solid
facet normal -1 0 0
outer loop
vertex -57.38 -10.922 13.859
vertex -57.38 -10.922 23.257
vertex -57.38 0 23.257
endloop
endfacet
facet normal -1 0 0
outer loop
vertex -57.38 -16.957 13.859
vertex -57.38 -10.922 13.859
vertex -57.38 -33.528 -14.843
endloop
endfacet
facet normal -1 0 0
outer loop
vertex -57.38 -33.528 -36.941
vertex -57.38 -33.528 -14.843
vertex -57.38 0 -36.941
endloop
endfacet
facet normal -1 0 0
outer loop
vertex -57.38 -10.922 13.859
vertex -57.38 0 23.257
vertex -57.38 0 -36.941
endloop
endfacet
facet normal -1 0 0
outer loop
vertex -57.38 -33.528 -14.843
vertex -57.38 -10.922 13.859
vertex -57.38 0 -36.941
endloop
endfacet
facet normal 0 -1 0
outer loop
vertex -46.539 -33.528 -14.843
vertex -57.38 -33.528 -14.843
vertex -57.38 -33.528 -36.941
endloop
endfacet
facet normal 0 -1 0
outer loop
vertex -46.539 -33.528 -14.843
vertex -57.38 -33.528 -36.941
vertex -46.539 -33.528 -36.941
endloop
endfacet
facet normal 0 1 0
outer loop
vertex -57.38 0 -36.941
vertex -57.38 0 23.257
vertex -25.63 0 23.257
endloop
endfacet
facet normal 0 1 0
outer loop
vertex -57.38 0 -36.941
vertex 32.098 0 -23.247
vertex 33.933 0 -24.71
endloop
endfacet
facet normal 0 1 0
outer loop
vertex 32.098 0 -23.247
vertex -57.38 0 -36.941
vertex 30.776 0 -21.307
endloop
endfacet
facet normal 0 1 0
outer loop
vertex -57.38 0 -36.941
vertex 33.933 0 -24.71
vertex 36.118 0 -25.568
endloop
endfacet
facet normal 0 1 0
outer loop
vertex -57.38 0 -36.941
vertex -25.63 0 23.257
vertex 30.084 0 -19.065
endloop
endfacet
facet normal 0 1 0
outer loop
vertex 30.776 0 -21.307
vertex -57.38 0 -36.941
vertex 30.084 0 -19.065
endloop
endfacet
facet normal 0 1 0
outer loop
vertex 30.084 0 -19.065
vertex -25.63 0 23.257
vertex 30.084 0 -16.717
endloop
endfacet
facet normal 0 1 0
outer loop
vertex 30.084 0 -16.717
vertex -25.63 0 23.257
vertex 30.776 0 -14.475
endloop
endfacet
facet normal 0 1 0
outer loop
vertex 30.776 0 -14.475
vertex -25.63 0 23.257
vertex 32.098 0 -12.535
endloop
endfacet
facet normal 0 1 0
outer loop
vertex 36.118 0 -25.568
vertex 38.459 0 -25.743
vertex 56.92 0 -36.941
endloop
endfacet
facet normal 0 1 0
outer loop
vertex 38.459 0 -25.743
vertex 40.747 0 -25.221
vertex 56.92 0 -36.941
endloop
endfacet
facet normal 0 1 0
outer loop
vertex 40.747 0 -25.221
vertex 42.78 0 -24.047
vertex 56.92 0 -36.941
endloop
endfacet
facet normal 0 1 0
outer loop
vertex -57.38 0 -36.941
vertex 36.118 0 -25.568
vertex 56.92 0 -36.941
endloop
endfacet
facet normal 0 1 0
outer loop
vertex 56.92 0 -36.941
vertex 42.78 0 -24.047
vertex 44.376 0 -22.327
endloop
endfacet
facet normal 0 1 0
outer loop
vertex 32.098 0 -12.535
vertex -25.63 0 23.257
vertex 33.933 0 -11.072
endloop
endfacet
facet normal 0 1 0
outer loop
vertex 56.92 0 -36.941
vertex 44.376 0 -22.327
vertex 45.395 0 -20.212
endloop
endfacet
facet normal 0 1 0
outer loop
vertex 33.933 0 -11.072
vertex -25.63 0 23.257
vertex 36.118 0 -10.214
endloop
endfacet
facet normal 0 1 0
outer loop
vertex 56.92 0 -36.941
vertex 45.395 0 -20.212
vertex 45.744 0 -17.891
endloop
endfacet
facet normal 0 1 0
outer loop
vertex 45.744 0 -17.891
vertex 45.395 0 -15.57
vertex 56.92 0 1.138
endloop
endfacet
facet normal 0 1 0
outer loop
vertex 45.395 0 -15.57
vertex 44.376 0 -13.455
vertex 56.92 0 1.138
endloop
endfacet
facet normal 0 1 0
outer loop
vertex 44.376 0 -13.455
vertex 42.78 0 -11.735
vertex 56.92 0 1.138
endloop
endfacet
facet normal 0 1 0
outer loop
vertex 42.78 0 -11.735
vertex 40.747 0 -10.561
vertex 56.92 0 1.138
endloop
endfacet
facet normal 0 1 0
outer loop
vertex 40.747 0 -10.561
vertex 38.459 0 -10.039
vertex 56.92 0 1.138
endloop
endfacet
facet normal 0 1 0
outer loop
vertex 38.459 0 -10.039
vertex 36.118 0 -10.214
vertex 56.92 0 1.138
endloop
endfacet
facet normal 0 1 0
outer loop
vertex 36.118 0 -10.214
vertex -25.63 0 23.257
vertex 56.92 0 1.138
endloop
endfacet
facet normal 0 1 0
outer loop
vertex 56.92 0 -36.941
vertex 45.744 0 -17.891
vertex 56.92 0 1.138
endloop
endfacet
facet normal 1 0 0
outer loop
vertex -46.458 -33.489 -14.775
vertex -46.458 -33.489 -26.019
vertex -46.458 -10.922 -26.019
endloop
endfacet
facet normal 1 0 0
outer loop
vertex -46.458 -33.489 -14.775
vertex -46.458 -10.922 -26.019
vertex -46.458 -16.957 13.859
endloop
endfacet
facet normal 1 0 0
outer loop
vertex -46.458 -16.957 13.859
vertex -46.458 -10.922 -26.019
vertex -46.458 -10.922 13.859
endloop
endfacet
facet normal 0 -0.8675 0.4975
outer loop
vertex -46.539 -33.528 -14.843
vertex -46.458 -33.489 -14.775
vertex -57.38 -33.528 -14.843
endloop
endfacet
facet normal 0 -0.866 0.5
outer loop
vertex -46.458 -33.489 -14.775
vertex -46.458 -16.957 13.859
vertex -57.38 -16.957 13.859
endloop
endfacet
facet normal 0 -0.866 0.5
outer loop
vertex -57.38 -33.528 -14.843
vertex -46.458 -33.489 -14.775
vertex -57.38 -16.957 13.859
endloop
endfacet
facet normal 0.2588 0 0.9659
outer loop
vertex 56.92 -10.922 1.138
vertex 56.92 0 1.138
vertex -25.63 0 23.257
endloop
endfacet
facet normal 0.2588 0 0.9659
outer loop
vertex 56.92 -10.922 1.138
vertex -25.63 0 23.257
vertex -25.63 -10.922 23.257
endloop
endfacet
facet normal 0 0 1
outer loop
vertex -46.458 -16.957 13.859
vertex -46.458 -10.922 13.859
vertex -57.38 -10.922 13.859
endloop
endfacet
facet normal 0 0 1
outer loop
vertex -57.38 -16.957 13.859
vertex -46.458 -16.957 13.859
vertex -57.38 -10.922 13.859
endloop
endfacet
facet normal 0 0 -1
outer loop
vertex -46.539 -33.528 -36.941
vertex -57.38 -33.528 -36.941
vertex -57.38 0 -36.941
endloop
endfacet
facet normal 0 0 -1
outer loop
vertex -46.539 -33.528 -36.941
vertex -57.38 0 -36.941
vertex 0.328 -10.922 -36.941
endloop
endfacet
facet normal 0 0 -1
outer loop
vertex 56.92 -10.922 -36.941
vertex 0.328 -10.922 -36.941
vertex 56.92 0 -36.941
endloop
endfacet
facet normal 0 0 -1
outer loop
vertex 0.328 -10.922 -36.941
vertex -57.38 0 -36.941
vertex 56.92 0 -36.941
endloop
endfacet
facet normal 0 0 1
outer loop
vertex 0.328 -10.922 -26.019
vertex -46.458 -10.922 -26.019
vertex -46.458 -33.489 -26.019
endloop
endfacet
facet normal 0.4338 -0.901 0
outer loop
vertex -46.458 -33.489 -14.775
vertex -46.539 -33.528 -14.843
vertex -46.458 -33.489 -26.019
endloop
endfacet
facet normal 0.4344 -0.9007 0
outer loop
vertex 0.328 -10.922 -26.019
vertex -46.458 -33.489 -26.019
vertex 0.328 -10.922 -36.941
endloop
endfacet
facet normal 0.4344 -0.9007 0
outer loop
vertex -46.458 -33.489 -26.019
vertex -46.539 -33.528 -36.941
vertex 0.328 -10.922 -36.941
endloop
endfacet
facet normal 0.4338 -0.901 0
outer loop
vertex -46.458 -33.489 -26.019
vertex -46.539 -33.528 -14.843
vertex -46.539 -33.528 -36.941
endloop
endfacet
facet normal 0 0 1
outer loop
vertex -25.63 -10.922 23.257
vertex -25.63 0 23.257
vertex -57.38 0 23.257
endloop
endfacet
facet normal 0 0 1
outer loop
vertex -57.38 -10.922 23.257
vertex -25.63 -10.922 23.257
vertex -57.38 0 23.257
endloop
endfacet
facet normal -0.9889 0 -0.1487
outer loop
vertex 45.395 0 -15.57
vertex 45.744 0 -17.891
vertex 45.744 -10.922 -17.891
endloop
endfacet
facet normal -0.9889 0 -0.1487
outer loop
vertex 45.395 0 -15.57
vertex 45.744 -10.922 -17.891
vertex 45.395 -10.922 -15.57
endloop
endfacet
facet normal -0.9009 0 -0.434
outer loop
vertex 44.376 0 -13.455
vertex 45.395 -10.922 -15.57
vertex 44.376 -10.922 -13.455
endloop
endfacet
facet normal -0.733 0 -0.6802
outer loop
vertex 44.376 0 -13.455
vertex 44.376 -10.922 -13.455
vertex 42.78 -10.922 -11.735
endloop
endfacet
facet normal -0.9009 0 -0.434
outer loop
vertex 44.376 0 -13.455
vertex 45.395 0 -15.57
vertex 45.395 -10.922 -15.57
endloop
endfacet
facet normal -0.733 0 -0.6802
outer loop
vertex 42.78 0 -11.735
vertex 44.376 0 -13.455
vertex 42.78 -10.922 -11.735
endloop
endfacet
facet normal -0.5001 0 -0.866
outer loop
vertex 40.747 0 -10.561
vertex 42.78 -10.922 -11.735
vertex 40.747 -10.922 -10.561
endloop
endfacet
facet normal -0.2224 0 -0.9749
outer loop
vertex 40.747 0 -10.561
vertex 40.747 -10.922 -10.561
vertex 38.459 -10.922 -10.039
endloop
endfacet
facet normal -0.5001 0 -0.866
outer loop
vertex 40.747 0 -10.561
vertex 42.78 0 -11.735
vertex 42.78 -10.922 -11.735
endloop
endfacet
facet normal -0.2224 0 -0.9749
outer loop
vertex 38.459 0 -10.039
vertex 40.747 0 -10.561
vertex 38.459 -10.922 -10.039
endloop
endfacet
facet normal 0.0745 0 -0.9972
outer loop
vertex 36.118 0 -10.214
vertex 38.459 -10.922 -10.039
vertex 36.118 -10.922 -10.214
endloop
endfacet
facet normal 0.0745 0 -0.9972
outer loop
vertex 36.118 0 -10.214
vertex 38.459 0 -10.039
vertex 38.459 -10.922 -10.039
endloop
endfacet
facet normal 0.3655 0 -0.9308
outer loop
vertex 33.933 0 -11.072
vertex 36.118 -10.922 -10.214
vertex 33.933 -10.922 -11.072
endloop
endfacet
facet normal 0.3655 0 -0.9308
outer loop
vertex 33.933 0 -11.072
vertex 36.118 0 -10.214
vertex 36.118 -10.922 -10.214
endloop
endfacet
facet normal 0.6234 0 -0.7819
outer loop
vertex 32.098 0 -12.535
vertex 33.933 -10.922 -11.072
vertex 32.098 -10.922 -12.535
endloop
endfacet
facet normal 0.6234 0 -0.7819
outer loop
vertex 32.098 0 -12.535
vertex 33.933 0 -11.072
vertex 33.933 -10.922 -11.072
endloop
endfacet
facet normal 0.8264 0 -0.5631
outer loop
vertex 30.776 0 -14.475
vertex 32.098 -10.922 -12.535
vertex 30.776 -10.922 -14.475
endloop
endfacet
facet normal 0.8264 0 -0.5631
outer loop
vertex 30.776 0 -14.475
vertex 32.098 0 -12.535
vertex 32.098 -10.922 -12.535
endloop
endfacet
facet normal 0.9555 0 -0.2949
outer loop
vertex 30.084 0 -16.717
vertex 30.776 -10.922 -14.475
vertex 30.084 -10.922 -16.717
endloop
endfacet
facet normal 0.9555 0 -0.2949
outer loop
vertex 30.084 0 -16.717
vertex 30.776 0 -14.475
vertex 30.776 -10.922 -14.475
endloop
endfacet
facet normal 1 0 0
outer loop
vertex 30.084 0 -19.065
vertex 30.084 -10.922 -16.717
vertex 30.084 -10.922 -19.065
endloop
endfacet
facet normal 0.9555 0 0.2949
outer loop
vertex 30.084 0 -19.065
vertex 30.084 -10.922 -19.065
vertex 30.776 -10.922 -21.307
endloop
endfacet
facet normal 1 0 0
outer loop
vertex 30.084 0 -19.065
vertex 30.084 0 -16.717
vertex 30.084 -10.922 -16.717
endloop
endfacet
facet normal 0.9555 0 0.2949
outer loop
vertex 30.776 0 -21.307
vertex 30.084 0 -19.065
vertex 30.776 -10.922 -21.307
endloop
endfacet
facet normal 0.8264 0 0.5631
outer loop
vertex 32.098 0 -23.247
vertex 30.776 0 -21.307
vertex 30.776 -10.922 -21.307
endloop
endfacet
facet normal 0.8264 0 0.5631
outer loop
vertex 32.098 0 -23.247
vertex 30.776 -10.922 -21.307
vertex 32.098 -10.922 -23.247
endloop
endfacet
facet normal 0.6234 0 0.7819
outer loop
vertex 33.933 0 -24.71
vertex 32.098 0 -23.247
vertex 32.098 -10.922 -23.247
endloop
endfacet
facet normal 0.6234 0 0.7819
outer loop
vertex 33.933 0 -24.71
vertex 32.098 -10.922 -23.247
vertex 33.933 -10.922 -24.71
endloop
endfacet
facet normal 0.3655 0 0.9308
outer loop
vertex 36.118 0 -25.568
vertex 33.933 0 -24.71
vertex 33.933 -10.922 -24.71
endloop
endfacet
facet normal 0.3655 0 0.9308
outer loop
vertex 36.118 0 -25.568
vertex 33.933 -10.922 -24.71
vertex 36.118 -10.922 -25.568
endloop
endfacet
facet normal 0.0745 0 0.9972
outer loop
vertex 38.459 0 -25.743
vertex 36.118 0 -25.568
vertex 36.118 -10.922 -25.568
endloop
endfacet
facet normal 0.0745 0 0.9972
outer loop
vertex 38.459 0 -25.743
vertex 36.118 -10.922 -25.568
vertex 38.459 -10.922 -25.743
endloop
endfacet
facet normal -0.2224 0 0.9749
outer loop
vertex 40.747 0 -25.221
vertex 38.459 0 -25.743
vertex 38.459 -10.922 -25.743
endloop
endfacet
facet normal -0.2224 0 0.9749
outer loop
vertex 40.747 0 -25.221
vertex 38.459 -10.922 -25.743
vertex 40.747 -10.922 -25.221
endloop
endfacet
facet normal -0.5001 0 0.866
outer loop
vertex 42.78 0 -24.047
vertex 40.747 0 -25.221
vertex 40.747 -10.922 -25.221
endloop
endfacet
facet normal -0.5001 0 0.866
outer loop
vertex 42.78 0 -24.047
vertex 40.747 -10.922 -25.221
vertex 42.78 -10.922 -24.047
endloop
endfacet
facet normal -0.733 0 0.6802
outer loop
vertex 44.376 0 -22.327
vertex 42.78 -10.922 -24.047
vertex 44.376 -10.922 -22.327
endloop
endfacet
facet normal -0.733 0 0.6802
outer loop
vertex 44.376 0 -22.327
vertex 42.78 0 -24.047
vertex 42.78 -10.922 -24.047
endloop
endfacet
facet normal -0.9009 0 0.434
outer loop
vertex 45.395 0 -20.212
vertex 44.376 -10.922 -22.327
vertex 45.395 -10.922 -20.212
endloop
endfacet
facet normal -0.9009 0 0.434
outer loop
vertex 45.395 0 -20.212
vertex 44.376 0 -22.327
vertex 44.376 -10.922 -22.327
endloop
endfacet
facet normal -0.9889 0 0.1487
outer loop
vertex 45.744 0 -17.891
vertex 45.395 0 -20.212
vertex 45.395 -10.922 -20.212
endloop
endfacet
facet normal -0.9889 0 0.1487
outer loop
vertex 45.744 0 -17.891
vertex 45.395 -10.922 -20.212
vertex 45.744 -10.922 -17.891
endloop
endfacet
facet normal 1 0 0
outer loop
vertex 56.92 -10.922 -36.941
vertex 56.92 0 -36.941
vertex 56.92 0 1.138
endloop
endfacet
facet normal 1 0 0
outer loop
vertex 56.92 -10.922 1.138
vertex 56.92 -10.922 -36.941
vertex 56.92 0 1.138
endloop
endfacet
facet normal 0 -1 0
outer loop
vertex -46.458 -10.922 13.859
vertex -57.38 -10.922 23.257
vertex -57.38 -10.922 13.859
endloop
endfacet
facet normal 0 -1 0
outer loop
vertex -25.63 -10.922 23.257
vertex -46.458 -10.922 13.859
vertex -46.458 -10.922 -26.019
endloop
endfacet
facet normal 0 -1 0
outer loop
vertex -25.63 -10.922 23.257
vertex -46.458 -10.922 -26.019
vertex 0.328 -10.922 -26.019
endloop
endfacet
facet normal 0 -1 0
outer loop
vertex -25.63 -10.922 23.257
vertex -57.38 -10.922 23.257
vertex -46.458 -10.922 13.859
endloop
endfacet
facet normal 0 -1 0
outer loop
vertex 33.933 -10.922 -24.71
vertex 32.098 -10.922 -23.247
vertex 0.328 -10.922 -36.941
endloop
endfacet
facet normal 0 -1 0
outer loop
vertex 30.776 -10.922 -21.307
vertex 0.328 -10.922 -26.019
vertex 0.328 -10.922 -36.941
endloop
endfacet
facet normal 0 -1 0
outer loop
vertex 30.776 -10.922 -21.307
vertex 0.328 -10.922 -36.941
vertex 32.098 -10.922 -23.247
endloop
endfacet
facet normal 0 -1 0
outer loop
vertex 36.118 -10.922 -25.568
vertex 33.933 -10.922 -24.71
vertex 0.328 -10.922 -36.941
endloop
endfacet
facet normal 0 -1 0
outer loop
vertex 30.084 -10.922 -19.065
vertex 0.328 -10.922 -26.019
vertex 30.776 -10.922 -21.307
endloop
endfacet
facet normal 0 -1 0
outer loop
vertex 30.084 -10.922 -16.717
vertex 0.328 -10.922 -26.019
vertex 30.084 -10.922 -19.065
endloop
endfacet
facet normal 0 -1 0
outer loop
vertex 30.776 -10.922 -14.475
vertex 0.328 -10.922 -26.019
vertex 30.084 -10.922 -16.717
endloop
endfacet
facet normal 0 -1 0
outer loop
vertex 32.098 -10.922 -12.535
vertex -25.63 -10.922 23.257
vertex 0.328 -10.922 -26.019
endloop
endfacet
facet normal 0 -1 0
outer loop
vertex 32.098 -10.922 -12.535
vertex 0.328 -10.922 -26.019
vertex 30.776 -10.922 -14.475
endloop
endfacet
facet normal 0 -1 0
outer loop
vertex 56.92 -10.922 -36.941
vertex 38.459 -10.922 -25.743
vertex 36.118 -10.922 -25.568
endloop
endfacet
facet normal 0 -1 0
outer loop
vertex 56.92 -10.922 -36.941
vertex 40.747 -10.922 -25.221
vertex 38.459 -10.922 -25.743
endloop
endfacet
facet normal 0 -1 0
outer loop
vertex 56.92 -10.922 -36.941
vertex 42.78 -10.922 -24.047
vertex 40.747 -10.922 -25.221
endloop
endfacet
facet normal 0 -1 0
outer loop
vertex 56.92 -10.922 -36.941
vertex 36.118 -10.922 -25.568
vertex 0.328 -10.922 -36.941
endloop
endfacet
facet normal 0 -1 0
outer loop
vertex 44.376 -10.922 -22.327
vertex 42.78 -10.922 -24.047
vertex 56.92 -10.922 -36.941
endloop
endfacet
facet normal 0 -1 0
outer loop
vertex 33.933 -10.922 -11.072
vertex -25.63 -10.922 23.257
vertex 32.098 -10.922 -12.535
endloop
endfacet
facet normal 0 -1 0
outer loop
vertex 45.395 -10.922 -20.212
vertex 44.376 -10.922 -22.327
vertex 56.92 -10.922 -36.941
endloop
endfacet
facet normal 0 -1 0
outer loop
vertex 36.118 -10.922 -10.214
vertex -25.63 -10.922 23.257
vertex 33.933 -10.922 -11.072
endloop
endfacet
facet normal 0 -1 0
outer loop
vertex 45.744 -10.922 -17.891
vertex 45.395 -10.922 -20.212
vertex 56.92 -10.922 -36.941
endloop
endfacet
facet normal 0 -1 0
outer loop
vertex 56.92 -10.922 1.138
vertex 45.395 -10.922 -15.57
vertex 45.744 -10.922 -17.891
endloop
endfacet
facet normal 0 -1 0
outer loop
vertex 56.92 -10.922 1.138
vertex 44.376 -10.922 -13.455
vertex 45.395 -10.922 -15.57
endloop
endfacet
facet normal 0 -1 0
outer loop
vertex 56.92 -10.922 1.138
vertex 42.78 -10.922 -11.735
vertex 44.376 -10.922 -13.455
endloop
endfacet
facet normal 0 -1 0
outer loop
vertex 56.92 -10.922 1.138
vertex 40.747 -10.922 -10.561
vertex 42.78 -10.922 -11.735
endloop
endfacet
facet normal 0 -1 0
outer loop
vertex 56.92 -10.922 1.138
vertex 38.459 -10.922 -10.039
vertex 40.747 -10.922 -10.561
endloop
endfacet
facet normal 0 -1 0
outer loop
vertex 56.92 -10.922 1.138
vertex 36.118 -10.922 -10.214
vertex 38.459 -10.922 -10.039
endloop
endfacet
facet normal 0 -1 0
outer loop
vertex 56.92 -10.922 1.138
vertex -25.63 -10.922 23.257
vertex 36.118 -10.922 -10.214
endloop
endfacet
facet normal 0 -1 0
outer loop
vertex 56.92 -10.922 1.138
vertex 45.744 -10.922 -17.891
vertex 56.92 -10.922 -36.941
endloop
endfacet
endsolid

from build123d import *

# Parameters (mm, degrees)
F0_R        = 7.874
F1_DEPTH    = 10.922
F0_W        = 52.578
F0_H        = 10.922
F2_DEPTH    = 33.528
F3_SIZE2    = 22.1192058352
F3_SIZE     = 82.55
F4_T4_DEPTH = 283.7447130195
F5_SIZE2    = 16.5711074263
F5_SIZE     = 28.702


# Not quite as in the source:
# - a fillet or chamfer that OpenCascade refuses, or shapes differently, is made with other operations: its cross-section is extruded or revolved along the edge and cut away or added


with BuildPart() as f1:
    # F0 (on Front) → F1 (new body)
    with BuildSketch(Plane.XZ):
        Polygon((56.9204140842, 23.2569413837), (-57.3795859158, 23.2569413837), (-57.3795859158, 13.8589413837), (-46.4575859158, 13.8589413837), (-46.4575859158, -26.0190586163), (6.1204140842, -26.0190586163), (6.1204140842, -36.9410586163), (56.9204140842, -36.9410586163), align=None)
        with Locations((37.8704140842, -17.8910586163)):
            Circle(F0_R, mode=Mode.SUBTRACT)
    extrude(amount=F1_DEPTH)

    # F0 (on Front) → F2 (join)
    with BuildSketch(Plane.XZ):
        Polygon((-46.4575859158, 13.8589413837), (-57.3795859158, 13.8589413837), (-57.3795859158, -36.9410586163), (-46.4575859158, -36.9410586163), (-46.4575859158, -26.0190586163), align=None)
        with Locations((-20.1685859158, -31.4800586163)):
            Rectangle(F0_W, F0_H)
    extrude(amount=F2_DEPTH)

    # F3
    f3_edges = [f1.edges().sort_by_distance(p)[0] for p in [
        (56.920414, -5.461, 23.256941),
    ]]
    f3_side = f1.faces().sort_by_distance((-0.229586, -5.461, 23.256941))[0]
    chamfer(f3_edges, length=F3_SIZE, length2=F3_SIZE2, reference=f3_side)

    # F4: chamfer of 25.4 x 52.6596501835 on 1 edges, made by hand


with BuildPart() as f4_tool2:
    # F4_s3 → F4_t4 (new body)
    with BuildSketch(Plane.XY.offset(-173.3524151261)):
        Polygon((-46.5392360993, -33.528), (6.1204140842, -8.128), (6.1204140842, -33.528), align=None)
    extrude(amount=F4_T4_DEPTH)

    split(bisect_by=Plane.XZ.offset(10.922), keep=Keep.TOP)


with BuildPart() as f1_1:
    add(f1.part)

    # F4_t1: cut F4_tool2
    add(f4_tool2.part, mode=Mode.SUBTRACT)

    # F5
    f5_edges = [f1_1.edges().sort_by_distance(p)[0] for p in [
        (-51.959411, -33.528, 13.858941),
    ]]
    f5_side = f1_1.faces().sort_by_distance((-51.959411, -33.528, -11.541059))[0]
    chamfer(f5_edges, length=F5_SIZE, length2=F5_SIZE2, reference=f5_side)


solid = f1_1.part
